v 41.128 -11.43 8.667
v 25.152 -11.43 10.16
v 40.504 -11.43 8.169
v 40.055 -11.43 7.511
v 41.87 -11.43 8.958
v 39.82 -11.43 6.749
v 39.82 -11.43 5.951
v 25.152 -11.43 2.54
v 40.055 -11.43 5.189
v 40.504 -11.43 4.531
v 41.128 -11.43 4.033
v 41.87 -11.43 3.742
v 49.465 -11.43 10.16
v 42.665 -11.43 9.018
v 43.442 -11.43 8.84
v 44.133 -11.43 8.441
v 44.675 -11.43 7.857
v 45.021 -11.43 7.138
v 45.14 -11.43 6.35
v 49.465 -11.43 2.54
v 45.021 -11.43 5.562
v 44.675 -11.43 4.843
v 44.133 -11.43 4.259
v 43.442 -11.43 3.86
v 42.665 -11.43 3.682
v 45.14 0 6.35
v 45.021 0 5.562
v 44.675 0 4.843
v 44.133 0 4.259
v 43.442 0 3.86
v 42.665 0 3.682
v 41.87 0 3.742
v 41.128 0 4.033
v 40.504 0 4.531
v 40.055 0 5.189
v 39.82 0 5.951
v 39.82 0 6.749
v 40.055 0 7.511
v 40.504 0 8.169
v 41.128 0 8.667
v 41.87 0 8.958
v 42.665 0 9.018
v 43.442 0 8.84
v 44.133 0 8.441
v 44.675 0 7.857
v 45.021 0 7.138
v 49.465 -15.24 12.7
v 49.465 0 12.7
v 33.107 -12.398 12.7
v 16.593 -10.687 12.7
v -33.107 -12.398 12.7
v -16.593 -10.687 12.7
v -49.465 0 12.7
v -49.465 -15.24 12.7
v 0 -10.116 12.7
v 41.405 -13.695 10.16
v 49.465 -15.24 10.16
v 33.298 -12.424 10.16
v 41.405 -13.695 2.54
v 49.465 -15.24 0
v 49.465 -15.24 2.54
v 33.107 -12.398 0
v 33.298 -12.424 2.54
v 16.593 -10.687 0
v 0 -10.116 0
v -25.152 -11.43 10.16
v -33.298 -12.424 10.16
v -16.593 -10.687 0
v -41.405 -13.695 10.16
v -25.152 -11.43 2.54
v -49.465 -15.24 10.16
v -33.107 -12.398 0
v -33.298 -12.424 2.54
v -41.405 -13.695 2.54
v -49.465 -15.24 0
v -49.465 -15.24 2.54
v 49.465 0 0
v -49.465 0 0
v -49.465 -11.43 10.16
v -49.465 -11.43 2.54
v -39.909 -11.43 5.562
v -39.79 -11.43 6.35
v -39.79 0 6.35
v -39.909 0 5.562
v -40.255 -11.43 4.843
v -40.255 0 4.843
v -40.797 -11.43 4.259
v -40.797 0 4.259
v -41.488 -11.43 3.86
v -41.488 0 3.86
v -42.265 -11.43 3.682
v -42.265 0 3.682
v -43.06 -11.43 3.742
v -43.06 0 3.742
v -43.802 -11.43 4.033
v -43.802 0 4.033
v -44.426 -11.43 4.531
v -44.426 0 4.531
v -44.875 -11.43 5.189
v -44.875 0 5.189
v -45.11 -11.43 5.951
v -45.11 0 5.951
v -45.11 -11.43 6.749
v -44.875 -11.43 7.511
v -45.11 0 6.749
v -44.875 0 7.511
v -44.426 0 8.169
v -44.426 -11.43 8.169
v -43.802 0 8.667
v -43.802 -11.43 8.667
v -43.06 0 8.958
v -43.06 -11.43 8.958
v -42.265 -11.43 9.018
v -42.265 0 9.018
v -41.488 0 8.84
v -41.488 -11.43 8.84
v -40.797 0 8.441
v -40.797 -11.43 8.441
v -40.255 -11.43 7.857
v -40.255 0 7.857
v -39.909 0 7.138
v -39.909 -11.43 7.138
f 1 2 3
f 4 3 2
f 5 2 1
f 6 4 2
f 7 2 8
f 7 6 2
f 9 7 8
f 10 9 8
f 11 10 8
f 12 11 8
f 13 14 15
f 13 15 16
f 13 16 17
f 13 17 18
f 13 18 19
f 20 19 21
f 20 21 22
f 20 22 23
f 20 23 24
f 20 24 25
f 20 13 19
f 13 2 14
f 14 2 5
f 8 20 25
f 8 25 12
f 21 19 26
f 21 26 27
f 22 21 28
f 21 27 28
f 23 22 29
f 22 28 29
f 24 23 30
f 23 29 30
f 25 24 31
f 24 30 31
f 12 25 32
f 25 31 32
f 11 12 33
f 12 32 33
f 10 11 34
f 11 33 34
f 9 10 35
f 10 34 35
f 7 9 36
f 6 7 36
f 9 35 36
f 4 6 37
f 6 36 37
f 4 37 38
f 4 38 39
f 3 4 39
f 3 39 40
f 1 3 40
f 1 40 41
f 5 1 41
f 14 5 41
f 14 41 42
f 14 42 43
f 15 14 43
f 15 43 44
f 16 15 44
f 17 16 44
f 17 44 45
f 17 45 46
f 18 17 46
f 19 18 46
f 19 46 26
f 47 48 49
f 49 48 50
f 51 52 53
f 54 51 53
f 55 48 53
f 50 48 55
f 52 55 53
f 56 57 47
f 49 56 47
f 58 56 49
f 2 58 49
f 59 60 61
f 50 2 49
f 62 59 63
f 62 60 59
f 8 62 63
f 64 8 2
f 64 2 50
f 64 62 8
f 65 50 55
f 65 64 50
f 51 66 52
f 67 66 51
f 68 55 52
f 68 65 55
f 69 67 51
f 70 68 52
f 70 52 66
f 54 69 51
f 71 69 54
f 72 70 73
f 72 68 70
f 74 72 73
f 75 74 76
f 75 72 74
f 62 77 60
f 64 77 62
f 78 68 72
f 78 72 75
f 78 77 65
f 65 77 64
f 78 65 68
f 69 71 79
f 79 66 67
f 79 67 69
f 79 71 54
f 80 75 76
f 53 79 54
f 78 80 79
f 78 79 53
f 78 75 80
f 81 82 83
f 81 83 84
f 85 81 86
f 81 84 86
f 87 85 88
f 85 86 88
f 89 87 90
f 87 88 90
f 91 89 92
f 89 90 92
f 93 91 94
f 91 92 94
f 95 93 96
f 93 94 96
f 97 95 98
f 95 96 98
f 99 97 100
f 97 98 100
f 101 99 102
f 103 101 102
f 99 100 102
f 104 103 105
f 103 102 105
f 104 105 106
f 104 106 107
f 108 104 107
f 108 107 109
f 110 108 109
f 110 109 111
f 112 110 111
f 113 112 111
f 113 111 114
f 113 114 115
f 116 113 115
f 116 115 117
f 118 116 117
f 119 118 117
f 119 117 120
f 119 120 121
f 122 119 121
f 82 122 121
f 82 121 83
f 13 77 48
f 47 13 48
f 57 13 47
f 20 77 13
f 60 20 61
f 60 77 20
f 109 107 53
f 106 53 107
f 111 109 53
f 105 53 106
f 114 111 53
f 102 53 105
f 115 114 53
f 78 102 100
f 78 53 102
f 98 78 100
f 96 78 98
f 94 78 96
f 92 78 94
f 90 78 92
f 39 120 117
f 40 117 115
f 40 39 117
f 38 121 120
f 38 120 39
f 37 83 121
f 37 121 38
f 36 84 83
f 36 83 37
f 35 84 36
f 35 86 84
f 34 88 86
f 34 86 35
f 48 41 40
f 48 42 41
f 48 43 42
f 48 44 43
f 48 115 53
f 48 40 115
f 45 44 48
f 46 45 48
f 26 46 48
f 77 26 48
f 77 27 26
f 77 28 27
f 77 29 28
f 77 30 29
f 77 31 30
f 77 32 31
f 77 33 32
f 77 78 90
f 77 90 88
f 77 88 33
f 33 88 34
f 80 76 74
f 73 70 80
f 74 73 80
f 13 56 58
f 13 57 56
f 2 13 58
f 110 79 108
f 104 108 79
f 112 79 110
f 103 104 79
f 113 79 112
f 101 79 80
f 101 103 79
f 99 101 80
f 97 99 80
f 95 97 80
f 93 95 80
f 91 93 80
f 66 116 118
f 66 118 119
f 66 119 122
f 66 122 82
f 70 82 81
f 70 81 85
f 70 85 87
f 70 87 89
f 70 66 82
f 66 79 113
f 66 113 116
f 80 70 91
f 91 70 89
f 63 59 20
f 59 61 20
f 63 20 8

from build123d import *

# Parameters (mm, degrees)
BOSS_EXTRUDE1_DEPTH = 12.7
SKETCH2_R           = 2.675
CUT_EXTRUDE1_DEPTH  = 16.24
SKETCH3_W           = 7.62
SKETCH3_H           = 3.81
CUT_EXTRUDE2_DEPTH  = 99.9300001


with BuildPart() as part:
    # Sketch1 → Boss-Extrude1 (new body)
    with BuildSketch(Plane.XY):
        with BuildLine():
            Line((-49.465, 0), (49.465, 0))
            Line((49.465, 0), (49.465, -15.24))
            ThreePointArc((49.465, -15.24), (0, -10.115578278), (-49.465, -15.24))
            Line((-49.465, -15.24), (-49.465, 0))
        make_face()
    extrude(amount=BOSS_EXTRUDE1_DEPTH)

    # Sketch2 → Cut-Extrude1 (cut, through all)
    with BuildSketch(Plane(origin=(0, 0, 0), x_dir=(1, 0, 0), z_dir=(0, 1, 0))):
        with Locations((-42.465, -6.35)):
            Circle(SKETCH2_R)
        with Locations((42.465, -6.35)):
            Circle(SKETCH2_R)
    extrude(amount=-CUT_EXTRUDE1_DEPTH, mode=Mode.SUBTRACT)

    # Sketch3 → Cut-Extrude2 (cut, through all)
    with BuildSketch(Plane(origin=(49.465, 0, 0), x_dir=(0, 0, -1), z_dir=(1, 0, 0))):
        with Locations((-6.35, -13.335)):
            Rectangle(SKETCH3_W, SKETCH3_H)
    extrude(amount=-CUT_EXTRUDE2_DEPTH, mode=Mode.SUBTRACT)


solid = part.part
